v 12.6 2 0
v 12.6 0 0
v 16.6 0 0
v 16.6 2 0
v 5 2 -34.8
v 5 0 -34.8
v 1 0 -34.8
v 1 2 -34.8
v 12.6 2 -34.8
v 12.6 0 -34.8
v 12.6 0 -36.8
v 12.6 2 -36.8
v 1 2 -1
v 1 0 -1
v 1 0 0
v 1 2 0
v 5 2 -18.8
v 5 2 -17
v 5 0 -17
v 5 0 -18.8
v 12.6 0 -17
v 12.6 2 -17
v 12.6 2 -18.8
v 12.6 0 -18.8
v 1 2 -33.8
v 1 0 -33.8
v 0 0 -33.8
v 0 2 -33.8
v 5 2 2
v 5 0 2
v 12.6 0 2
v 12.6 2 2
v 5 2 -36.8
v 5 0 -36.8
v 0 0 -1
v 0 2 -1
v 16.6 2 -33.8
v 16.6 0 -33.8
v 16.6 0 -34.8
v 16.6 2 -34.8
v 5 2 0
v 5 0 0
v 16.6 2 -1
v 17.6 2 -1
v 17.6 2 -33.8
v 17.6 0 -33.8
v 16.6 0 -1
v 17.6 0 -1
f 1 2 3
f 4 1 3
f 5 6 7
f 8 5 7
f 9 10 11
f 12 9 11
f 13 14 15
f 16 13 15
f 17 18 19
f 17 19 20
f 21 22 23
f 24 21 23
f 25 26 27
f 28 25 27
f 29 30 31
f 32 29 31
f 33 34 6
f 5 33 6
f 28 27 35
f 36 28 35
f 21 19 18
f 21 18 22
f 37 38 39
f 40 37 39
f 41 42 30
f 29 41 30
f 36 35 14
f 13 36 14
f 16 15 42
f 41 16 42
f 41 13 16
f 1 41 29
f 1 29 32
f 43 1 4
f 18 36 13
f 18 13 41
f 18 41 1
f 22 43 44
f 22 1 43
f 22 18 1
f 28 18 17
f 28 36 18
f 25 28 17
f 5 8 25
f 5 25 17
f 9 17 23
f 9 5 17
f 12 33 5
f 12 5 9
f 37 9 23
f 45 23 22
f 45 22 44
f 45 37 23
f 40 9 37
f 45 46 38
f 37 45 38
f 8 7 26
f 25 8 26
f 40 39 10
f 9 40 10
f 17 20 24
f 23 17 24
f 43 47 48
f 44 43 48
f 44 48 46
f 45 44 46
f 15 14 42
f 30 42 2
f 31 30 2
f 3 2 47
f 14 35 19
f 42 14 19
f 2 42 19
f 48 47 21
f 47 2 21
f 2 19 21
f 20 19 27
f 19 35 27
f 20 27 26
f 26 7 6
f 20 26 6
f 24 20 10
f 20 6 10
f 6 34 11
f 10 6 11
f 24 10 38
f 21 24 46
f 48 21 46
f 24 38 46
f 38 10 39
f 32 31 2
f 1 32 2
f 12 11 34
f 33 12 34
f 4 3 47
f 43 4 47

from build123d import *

# Parameters (mm, degrees)
SKETCH_1_W      = 7.6
SKETCH_1_H      = 1.8
EXTRUDE_1_DEPTH = 2


with BuildPart() as part:
    # 草图1 → 凸台-拉伸1 (new body)
    with BuildSketch(Plane(origin=(0, 0, 0), x_dir=(1, 0, 0), z_dir=(0, 1, 0))):
        Polygon((1, 1), (1, 0), (5, 0), (5, -2), (12.6, -2), (12.6, 0), (16.6, 0), (16.6, 1), (17.6, 1), (17.6, 33.8), (16.6, 33.8), (16.6, 34.8), (12.6, 34.8), (12.6, 36.8), (5, 36.8), (5, 34.8), (1, 34.8), (1, 33.8), (0, 33.8), (0, 1), align=None)
        with Locations((8.8, 17.9)):
            Rectangle(SKETCH_1_W, SKETCH_1_H, mode=Mode.SUBTRACT)
    extrude(amount=EXTRUDE_1_DEPTH)


solid = part.part
